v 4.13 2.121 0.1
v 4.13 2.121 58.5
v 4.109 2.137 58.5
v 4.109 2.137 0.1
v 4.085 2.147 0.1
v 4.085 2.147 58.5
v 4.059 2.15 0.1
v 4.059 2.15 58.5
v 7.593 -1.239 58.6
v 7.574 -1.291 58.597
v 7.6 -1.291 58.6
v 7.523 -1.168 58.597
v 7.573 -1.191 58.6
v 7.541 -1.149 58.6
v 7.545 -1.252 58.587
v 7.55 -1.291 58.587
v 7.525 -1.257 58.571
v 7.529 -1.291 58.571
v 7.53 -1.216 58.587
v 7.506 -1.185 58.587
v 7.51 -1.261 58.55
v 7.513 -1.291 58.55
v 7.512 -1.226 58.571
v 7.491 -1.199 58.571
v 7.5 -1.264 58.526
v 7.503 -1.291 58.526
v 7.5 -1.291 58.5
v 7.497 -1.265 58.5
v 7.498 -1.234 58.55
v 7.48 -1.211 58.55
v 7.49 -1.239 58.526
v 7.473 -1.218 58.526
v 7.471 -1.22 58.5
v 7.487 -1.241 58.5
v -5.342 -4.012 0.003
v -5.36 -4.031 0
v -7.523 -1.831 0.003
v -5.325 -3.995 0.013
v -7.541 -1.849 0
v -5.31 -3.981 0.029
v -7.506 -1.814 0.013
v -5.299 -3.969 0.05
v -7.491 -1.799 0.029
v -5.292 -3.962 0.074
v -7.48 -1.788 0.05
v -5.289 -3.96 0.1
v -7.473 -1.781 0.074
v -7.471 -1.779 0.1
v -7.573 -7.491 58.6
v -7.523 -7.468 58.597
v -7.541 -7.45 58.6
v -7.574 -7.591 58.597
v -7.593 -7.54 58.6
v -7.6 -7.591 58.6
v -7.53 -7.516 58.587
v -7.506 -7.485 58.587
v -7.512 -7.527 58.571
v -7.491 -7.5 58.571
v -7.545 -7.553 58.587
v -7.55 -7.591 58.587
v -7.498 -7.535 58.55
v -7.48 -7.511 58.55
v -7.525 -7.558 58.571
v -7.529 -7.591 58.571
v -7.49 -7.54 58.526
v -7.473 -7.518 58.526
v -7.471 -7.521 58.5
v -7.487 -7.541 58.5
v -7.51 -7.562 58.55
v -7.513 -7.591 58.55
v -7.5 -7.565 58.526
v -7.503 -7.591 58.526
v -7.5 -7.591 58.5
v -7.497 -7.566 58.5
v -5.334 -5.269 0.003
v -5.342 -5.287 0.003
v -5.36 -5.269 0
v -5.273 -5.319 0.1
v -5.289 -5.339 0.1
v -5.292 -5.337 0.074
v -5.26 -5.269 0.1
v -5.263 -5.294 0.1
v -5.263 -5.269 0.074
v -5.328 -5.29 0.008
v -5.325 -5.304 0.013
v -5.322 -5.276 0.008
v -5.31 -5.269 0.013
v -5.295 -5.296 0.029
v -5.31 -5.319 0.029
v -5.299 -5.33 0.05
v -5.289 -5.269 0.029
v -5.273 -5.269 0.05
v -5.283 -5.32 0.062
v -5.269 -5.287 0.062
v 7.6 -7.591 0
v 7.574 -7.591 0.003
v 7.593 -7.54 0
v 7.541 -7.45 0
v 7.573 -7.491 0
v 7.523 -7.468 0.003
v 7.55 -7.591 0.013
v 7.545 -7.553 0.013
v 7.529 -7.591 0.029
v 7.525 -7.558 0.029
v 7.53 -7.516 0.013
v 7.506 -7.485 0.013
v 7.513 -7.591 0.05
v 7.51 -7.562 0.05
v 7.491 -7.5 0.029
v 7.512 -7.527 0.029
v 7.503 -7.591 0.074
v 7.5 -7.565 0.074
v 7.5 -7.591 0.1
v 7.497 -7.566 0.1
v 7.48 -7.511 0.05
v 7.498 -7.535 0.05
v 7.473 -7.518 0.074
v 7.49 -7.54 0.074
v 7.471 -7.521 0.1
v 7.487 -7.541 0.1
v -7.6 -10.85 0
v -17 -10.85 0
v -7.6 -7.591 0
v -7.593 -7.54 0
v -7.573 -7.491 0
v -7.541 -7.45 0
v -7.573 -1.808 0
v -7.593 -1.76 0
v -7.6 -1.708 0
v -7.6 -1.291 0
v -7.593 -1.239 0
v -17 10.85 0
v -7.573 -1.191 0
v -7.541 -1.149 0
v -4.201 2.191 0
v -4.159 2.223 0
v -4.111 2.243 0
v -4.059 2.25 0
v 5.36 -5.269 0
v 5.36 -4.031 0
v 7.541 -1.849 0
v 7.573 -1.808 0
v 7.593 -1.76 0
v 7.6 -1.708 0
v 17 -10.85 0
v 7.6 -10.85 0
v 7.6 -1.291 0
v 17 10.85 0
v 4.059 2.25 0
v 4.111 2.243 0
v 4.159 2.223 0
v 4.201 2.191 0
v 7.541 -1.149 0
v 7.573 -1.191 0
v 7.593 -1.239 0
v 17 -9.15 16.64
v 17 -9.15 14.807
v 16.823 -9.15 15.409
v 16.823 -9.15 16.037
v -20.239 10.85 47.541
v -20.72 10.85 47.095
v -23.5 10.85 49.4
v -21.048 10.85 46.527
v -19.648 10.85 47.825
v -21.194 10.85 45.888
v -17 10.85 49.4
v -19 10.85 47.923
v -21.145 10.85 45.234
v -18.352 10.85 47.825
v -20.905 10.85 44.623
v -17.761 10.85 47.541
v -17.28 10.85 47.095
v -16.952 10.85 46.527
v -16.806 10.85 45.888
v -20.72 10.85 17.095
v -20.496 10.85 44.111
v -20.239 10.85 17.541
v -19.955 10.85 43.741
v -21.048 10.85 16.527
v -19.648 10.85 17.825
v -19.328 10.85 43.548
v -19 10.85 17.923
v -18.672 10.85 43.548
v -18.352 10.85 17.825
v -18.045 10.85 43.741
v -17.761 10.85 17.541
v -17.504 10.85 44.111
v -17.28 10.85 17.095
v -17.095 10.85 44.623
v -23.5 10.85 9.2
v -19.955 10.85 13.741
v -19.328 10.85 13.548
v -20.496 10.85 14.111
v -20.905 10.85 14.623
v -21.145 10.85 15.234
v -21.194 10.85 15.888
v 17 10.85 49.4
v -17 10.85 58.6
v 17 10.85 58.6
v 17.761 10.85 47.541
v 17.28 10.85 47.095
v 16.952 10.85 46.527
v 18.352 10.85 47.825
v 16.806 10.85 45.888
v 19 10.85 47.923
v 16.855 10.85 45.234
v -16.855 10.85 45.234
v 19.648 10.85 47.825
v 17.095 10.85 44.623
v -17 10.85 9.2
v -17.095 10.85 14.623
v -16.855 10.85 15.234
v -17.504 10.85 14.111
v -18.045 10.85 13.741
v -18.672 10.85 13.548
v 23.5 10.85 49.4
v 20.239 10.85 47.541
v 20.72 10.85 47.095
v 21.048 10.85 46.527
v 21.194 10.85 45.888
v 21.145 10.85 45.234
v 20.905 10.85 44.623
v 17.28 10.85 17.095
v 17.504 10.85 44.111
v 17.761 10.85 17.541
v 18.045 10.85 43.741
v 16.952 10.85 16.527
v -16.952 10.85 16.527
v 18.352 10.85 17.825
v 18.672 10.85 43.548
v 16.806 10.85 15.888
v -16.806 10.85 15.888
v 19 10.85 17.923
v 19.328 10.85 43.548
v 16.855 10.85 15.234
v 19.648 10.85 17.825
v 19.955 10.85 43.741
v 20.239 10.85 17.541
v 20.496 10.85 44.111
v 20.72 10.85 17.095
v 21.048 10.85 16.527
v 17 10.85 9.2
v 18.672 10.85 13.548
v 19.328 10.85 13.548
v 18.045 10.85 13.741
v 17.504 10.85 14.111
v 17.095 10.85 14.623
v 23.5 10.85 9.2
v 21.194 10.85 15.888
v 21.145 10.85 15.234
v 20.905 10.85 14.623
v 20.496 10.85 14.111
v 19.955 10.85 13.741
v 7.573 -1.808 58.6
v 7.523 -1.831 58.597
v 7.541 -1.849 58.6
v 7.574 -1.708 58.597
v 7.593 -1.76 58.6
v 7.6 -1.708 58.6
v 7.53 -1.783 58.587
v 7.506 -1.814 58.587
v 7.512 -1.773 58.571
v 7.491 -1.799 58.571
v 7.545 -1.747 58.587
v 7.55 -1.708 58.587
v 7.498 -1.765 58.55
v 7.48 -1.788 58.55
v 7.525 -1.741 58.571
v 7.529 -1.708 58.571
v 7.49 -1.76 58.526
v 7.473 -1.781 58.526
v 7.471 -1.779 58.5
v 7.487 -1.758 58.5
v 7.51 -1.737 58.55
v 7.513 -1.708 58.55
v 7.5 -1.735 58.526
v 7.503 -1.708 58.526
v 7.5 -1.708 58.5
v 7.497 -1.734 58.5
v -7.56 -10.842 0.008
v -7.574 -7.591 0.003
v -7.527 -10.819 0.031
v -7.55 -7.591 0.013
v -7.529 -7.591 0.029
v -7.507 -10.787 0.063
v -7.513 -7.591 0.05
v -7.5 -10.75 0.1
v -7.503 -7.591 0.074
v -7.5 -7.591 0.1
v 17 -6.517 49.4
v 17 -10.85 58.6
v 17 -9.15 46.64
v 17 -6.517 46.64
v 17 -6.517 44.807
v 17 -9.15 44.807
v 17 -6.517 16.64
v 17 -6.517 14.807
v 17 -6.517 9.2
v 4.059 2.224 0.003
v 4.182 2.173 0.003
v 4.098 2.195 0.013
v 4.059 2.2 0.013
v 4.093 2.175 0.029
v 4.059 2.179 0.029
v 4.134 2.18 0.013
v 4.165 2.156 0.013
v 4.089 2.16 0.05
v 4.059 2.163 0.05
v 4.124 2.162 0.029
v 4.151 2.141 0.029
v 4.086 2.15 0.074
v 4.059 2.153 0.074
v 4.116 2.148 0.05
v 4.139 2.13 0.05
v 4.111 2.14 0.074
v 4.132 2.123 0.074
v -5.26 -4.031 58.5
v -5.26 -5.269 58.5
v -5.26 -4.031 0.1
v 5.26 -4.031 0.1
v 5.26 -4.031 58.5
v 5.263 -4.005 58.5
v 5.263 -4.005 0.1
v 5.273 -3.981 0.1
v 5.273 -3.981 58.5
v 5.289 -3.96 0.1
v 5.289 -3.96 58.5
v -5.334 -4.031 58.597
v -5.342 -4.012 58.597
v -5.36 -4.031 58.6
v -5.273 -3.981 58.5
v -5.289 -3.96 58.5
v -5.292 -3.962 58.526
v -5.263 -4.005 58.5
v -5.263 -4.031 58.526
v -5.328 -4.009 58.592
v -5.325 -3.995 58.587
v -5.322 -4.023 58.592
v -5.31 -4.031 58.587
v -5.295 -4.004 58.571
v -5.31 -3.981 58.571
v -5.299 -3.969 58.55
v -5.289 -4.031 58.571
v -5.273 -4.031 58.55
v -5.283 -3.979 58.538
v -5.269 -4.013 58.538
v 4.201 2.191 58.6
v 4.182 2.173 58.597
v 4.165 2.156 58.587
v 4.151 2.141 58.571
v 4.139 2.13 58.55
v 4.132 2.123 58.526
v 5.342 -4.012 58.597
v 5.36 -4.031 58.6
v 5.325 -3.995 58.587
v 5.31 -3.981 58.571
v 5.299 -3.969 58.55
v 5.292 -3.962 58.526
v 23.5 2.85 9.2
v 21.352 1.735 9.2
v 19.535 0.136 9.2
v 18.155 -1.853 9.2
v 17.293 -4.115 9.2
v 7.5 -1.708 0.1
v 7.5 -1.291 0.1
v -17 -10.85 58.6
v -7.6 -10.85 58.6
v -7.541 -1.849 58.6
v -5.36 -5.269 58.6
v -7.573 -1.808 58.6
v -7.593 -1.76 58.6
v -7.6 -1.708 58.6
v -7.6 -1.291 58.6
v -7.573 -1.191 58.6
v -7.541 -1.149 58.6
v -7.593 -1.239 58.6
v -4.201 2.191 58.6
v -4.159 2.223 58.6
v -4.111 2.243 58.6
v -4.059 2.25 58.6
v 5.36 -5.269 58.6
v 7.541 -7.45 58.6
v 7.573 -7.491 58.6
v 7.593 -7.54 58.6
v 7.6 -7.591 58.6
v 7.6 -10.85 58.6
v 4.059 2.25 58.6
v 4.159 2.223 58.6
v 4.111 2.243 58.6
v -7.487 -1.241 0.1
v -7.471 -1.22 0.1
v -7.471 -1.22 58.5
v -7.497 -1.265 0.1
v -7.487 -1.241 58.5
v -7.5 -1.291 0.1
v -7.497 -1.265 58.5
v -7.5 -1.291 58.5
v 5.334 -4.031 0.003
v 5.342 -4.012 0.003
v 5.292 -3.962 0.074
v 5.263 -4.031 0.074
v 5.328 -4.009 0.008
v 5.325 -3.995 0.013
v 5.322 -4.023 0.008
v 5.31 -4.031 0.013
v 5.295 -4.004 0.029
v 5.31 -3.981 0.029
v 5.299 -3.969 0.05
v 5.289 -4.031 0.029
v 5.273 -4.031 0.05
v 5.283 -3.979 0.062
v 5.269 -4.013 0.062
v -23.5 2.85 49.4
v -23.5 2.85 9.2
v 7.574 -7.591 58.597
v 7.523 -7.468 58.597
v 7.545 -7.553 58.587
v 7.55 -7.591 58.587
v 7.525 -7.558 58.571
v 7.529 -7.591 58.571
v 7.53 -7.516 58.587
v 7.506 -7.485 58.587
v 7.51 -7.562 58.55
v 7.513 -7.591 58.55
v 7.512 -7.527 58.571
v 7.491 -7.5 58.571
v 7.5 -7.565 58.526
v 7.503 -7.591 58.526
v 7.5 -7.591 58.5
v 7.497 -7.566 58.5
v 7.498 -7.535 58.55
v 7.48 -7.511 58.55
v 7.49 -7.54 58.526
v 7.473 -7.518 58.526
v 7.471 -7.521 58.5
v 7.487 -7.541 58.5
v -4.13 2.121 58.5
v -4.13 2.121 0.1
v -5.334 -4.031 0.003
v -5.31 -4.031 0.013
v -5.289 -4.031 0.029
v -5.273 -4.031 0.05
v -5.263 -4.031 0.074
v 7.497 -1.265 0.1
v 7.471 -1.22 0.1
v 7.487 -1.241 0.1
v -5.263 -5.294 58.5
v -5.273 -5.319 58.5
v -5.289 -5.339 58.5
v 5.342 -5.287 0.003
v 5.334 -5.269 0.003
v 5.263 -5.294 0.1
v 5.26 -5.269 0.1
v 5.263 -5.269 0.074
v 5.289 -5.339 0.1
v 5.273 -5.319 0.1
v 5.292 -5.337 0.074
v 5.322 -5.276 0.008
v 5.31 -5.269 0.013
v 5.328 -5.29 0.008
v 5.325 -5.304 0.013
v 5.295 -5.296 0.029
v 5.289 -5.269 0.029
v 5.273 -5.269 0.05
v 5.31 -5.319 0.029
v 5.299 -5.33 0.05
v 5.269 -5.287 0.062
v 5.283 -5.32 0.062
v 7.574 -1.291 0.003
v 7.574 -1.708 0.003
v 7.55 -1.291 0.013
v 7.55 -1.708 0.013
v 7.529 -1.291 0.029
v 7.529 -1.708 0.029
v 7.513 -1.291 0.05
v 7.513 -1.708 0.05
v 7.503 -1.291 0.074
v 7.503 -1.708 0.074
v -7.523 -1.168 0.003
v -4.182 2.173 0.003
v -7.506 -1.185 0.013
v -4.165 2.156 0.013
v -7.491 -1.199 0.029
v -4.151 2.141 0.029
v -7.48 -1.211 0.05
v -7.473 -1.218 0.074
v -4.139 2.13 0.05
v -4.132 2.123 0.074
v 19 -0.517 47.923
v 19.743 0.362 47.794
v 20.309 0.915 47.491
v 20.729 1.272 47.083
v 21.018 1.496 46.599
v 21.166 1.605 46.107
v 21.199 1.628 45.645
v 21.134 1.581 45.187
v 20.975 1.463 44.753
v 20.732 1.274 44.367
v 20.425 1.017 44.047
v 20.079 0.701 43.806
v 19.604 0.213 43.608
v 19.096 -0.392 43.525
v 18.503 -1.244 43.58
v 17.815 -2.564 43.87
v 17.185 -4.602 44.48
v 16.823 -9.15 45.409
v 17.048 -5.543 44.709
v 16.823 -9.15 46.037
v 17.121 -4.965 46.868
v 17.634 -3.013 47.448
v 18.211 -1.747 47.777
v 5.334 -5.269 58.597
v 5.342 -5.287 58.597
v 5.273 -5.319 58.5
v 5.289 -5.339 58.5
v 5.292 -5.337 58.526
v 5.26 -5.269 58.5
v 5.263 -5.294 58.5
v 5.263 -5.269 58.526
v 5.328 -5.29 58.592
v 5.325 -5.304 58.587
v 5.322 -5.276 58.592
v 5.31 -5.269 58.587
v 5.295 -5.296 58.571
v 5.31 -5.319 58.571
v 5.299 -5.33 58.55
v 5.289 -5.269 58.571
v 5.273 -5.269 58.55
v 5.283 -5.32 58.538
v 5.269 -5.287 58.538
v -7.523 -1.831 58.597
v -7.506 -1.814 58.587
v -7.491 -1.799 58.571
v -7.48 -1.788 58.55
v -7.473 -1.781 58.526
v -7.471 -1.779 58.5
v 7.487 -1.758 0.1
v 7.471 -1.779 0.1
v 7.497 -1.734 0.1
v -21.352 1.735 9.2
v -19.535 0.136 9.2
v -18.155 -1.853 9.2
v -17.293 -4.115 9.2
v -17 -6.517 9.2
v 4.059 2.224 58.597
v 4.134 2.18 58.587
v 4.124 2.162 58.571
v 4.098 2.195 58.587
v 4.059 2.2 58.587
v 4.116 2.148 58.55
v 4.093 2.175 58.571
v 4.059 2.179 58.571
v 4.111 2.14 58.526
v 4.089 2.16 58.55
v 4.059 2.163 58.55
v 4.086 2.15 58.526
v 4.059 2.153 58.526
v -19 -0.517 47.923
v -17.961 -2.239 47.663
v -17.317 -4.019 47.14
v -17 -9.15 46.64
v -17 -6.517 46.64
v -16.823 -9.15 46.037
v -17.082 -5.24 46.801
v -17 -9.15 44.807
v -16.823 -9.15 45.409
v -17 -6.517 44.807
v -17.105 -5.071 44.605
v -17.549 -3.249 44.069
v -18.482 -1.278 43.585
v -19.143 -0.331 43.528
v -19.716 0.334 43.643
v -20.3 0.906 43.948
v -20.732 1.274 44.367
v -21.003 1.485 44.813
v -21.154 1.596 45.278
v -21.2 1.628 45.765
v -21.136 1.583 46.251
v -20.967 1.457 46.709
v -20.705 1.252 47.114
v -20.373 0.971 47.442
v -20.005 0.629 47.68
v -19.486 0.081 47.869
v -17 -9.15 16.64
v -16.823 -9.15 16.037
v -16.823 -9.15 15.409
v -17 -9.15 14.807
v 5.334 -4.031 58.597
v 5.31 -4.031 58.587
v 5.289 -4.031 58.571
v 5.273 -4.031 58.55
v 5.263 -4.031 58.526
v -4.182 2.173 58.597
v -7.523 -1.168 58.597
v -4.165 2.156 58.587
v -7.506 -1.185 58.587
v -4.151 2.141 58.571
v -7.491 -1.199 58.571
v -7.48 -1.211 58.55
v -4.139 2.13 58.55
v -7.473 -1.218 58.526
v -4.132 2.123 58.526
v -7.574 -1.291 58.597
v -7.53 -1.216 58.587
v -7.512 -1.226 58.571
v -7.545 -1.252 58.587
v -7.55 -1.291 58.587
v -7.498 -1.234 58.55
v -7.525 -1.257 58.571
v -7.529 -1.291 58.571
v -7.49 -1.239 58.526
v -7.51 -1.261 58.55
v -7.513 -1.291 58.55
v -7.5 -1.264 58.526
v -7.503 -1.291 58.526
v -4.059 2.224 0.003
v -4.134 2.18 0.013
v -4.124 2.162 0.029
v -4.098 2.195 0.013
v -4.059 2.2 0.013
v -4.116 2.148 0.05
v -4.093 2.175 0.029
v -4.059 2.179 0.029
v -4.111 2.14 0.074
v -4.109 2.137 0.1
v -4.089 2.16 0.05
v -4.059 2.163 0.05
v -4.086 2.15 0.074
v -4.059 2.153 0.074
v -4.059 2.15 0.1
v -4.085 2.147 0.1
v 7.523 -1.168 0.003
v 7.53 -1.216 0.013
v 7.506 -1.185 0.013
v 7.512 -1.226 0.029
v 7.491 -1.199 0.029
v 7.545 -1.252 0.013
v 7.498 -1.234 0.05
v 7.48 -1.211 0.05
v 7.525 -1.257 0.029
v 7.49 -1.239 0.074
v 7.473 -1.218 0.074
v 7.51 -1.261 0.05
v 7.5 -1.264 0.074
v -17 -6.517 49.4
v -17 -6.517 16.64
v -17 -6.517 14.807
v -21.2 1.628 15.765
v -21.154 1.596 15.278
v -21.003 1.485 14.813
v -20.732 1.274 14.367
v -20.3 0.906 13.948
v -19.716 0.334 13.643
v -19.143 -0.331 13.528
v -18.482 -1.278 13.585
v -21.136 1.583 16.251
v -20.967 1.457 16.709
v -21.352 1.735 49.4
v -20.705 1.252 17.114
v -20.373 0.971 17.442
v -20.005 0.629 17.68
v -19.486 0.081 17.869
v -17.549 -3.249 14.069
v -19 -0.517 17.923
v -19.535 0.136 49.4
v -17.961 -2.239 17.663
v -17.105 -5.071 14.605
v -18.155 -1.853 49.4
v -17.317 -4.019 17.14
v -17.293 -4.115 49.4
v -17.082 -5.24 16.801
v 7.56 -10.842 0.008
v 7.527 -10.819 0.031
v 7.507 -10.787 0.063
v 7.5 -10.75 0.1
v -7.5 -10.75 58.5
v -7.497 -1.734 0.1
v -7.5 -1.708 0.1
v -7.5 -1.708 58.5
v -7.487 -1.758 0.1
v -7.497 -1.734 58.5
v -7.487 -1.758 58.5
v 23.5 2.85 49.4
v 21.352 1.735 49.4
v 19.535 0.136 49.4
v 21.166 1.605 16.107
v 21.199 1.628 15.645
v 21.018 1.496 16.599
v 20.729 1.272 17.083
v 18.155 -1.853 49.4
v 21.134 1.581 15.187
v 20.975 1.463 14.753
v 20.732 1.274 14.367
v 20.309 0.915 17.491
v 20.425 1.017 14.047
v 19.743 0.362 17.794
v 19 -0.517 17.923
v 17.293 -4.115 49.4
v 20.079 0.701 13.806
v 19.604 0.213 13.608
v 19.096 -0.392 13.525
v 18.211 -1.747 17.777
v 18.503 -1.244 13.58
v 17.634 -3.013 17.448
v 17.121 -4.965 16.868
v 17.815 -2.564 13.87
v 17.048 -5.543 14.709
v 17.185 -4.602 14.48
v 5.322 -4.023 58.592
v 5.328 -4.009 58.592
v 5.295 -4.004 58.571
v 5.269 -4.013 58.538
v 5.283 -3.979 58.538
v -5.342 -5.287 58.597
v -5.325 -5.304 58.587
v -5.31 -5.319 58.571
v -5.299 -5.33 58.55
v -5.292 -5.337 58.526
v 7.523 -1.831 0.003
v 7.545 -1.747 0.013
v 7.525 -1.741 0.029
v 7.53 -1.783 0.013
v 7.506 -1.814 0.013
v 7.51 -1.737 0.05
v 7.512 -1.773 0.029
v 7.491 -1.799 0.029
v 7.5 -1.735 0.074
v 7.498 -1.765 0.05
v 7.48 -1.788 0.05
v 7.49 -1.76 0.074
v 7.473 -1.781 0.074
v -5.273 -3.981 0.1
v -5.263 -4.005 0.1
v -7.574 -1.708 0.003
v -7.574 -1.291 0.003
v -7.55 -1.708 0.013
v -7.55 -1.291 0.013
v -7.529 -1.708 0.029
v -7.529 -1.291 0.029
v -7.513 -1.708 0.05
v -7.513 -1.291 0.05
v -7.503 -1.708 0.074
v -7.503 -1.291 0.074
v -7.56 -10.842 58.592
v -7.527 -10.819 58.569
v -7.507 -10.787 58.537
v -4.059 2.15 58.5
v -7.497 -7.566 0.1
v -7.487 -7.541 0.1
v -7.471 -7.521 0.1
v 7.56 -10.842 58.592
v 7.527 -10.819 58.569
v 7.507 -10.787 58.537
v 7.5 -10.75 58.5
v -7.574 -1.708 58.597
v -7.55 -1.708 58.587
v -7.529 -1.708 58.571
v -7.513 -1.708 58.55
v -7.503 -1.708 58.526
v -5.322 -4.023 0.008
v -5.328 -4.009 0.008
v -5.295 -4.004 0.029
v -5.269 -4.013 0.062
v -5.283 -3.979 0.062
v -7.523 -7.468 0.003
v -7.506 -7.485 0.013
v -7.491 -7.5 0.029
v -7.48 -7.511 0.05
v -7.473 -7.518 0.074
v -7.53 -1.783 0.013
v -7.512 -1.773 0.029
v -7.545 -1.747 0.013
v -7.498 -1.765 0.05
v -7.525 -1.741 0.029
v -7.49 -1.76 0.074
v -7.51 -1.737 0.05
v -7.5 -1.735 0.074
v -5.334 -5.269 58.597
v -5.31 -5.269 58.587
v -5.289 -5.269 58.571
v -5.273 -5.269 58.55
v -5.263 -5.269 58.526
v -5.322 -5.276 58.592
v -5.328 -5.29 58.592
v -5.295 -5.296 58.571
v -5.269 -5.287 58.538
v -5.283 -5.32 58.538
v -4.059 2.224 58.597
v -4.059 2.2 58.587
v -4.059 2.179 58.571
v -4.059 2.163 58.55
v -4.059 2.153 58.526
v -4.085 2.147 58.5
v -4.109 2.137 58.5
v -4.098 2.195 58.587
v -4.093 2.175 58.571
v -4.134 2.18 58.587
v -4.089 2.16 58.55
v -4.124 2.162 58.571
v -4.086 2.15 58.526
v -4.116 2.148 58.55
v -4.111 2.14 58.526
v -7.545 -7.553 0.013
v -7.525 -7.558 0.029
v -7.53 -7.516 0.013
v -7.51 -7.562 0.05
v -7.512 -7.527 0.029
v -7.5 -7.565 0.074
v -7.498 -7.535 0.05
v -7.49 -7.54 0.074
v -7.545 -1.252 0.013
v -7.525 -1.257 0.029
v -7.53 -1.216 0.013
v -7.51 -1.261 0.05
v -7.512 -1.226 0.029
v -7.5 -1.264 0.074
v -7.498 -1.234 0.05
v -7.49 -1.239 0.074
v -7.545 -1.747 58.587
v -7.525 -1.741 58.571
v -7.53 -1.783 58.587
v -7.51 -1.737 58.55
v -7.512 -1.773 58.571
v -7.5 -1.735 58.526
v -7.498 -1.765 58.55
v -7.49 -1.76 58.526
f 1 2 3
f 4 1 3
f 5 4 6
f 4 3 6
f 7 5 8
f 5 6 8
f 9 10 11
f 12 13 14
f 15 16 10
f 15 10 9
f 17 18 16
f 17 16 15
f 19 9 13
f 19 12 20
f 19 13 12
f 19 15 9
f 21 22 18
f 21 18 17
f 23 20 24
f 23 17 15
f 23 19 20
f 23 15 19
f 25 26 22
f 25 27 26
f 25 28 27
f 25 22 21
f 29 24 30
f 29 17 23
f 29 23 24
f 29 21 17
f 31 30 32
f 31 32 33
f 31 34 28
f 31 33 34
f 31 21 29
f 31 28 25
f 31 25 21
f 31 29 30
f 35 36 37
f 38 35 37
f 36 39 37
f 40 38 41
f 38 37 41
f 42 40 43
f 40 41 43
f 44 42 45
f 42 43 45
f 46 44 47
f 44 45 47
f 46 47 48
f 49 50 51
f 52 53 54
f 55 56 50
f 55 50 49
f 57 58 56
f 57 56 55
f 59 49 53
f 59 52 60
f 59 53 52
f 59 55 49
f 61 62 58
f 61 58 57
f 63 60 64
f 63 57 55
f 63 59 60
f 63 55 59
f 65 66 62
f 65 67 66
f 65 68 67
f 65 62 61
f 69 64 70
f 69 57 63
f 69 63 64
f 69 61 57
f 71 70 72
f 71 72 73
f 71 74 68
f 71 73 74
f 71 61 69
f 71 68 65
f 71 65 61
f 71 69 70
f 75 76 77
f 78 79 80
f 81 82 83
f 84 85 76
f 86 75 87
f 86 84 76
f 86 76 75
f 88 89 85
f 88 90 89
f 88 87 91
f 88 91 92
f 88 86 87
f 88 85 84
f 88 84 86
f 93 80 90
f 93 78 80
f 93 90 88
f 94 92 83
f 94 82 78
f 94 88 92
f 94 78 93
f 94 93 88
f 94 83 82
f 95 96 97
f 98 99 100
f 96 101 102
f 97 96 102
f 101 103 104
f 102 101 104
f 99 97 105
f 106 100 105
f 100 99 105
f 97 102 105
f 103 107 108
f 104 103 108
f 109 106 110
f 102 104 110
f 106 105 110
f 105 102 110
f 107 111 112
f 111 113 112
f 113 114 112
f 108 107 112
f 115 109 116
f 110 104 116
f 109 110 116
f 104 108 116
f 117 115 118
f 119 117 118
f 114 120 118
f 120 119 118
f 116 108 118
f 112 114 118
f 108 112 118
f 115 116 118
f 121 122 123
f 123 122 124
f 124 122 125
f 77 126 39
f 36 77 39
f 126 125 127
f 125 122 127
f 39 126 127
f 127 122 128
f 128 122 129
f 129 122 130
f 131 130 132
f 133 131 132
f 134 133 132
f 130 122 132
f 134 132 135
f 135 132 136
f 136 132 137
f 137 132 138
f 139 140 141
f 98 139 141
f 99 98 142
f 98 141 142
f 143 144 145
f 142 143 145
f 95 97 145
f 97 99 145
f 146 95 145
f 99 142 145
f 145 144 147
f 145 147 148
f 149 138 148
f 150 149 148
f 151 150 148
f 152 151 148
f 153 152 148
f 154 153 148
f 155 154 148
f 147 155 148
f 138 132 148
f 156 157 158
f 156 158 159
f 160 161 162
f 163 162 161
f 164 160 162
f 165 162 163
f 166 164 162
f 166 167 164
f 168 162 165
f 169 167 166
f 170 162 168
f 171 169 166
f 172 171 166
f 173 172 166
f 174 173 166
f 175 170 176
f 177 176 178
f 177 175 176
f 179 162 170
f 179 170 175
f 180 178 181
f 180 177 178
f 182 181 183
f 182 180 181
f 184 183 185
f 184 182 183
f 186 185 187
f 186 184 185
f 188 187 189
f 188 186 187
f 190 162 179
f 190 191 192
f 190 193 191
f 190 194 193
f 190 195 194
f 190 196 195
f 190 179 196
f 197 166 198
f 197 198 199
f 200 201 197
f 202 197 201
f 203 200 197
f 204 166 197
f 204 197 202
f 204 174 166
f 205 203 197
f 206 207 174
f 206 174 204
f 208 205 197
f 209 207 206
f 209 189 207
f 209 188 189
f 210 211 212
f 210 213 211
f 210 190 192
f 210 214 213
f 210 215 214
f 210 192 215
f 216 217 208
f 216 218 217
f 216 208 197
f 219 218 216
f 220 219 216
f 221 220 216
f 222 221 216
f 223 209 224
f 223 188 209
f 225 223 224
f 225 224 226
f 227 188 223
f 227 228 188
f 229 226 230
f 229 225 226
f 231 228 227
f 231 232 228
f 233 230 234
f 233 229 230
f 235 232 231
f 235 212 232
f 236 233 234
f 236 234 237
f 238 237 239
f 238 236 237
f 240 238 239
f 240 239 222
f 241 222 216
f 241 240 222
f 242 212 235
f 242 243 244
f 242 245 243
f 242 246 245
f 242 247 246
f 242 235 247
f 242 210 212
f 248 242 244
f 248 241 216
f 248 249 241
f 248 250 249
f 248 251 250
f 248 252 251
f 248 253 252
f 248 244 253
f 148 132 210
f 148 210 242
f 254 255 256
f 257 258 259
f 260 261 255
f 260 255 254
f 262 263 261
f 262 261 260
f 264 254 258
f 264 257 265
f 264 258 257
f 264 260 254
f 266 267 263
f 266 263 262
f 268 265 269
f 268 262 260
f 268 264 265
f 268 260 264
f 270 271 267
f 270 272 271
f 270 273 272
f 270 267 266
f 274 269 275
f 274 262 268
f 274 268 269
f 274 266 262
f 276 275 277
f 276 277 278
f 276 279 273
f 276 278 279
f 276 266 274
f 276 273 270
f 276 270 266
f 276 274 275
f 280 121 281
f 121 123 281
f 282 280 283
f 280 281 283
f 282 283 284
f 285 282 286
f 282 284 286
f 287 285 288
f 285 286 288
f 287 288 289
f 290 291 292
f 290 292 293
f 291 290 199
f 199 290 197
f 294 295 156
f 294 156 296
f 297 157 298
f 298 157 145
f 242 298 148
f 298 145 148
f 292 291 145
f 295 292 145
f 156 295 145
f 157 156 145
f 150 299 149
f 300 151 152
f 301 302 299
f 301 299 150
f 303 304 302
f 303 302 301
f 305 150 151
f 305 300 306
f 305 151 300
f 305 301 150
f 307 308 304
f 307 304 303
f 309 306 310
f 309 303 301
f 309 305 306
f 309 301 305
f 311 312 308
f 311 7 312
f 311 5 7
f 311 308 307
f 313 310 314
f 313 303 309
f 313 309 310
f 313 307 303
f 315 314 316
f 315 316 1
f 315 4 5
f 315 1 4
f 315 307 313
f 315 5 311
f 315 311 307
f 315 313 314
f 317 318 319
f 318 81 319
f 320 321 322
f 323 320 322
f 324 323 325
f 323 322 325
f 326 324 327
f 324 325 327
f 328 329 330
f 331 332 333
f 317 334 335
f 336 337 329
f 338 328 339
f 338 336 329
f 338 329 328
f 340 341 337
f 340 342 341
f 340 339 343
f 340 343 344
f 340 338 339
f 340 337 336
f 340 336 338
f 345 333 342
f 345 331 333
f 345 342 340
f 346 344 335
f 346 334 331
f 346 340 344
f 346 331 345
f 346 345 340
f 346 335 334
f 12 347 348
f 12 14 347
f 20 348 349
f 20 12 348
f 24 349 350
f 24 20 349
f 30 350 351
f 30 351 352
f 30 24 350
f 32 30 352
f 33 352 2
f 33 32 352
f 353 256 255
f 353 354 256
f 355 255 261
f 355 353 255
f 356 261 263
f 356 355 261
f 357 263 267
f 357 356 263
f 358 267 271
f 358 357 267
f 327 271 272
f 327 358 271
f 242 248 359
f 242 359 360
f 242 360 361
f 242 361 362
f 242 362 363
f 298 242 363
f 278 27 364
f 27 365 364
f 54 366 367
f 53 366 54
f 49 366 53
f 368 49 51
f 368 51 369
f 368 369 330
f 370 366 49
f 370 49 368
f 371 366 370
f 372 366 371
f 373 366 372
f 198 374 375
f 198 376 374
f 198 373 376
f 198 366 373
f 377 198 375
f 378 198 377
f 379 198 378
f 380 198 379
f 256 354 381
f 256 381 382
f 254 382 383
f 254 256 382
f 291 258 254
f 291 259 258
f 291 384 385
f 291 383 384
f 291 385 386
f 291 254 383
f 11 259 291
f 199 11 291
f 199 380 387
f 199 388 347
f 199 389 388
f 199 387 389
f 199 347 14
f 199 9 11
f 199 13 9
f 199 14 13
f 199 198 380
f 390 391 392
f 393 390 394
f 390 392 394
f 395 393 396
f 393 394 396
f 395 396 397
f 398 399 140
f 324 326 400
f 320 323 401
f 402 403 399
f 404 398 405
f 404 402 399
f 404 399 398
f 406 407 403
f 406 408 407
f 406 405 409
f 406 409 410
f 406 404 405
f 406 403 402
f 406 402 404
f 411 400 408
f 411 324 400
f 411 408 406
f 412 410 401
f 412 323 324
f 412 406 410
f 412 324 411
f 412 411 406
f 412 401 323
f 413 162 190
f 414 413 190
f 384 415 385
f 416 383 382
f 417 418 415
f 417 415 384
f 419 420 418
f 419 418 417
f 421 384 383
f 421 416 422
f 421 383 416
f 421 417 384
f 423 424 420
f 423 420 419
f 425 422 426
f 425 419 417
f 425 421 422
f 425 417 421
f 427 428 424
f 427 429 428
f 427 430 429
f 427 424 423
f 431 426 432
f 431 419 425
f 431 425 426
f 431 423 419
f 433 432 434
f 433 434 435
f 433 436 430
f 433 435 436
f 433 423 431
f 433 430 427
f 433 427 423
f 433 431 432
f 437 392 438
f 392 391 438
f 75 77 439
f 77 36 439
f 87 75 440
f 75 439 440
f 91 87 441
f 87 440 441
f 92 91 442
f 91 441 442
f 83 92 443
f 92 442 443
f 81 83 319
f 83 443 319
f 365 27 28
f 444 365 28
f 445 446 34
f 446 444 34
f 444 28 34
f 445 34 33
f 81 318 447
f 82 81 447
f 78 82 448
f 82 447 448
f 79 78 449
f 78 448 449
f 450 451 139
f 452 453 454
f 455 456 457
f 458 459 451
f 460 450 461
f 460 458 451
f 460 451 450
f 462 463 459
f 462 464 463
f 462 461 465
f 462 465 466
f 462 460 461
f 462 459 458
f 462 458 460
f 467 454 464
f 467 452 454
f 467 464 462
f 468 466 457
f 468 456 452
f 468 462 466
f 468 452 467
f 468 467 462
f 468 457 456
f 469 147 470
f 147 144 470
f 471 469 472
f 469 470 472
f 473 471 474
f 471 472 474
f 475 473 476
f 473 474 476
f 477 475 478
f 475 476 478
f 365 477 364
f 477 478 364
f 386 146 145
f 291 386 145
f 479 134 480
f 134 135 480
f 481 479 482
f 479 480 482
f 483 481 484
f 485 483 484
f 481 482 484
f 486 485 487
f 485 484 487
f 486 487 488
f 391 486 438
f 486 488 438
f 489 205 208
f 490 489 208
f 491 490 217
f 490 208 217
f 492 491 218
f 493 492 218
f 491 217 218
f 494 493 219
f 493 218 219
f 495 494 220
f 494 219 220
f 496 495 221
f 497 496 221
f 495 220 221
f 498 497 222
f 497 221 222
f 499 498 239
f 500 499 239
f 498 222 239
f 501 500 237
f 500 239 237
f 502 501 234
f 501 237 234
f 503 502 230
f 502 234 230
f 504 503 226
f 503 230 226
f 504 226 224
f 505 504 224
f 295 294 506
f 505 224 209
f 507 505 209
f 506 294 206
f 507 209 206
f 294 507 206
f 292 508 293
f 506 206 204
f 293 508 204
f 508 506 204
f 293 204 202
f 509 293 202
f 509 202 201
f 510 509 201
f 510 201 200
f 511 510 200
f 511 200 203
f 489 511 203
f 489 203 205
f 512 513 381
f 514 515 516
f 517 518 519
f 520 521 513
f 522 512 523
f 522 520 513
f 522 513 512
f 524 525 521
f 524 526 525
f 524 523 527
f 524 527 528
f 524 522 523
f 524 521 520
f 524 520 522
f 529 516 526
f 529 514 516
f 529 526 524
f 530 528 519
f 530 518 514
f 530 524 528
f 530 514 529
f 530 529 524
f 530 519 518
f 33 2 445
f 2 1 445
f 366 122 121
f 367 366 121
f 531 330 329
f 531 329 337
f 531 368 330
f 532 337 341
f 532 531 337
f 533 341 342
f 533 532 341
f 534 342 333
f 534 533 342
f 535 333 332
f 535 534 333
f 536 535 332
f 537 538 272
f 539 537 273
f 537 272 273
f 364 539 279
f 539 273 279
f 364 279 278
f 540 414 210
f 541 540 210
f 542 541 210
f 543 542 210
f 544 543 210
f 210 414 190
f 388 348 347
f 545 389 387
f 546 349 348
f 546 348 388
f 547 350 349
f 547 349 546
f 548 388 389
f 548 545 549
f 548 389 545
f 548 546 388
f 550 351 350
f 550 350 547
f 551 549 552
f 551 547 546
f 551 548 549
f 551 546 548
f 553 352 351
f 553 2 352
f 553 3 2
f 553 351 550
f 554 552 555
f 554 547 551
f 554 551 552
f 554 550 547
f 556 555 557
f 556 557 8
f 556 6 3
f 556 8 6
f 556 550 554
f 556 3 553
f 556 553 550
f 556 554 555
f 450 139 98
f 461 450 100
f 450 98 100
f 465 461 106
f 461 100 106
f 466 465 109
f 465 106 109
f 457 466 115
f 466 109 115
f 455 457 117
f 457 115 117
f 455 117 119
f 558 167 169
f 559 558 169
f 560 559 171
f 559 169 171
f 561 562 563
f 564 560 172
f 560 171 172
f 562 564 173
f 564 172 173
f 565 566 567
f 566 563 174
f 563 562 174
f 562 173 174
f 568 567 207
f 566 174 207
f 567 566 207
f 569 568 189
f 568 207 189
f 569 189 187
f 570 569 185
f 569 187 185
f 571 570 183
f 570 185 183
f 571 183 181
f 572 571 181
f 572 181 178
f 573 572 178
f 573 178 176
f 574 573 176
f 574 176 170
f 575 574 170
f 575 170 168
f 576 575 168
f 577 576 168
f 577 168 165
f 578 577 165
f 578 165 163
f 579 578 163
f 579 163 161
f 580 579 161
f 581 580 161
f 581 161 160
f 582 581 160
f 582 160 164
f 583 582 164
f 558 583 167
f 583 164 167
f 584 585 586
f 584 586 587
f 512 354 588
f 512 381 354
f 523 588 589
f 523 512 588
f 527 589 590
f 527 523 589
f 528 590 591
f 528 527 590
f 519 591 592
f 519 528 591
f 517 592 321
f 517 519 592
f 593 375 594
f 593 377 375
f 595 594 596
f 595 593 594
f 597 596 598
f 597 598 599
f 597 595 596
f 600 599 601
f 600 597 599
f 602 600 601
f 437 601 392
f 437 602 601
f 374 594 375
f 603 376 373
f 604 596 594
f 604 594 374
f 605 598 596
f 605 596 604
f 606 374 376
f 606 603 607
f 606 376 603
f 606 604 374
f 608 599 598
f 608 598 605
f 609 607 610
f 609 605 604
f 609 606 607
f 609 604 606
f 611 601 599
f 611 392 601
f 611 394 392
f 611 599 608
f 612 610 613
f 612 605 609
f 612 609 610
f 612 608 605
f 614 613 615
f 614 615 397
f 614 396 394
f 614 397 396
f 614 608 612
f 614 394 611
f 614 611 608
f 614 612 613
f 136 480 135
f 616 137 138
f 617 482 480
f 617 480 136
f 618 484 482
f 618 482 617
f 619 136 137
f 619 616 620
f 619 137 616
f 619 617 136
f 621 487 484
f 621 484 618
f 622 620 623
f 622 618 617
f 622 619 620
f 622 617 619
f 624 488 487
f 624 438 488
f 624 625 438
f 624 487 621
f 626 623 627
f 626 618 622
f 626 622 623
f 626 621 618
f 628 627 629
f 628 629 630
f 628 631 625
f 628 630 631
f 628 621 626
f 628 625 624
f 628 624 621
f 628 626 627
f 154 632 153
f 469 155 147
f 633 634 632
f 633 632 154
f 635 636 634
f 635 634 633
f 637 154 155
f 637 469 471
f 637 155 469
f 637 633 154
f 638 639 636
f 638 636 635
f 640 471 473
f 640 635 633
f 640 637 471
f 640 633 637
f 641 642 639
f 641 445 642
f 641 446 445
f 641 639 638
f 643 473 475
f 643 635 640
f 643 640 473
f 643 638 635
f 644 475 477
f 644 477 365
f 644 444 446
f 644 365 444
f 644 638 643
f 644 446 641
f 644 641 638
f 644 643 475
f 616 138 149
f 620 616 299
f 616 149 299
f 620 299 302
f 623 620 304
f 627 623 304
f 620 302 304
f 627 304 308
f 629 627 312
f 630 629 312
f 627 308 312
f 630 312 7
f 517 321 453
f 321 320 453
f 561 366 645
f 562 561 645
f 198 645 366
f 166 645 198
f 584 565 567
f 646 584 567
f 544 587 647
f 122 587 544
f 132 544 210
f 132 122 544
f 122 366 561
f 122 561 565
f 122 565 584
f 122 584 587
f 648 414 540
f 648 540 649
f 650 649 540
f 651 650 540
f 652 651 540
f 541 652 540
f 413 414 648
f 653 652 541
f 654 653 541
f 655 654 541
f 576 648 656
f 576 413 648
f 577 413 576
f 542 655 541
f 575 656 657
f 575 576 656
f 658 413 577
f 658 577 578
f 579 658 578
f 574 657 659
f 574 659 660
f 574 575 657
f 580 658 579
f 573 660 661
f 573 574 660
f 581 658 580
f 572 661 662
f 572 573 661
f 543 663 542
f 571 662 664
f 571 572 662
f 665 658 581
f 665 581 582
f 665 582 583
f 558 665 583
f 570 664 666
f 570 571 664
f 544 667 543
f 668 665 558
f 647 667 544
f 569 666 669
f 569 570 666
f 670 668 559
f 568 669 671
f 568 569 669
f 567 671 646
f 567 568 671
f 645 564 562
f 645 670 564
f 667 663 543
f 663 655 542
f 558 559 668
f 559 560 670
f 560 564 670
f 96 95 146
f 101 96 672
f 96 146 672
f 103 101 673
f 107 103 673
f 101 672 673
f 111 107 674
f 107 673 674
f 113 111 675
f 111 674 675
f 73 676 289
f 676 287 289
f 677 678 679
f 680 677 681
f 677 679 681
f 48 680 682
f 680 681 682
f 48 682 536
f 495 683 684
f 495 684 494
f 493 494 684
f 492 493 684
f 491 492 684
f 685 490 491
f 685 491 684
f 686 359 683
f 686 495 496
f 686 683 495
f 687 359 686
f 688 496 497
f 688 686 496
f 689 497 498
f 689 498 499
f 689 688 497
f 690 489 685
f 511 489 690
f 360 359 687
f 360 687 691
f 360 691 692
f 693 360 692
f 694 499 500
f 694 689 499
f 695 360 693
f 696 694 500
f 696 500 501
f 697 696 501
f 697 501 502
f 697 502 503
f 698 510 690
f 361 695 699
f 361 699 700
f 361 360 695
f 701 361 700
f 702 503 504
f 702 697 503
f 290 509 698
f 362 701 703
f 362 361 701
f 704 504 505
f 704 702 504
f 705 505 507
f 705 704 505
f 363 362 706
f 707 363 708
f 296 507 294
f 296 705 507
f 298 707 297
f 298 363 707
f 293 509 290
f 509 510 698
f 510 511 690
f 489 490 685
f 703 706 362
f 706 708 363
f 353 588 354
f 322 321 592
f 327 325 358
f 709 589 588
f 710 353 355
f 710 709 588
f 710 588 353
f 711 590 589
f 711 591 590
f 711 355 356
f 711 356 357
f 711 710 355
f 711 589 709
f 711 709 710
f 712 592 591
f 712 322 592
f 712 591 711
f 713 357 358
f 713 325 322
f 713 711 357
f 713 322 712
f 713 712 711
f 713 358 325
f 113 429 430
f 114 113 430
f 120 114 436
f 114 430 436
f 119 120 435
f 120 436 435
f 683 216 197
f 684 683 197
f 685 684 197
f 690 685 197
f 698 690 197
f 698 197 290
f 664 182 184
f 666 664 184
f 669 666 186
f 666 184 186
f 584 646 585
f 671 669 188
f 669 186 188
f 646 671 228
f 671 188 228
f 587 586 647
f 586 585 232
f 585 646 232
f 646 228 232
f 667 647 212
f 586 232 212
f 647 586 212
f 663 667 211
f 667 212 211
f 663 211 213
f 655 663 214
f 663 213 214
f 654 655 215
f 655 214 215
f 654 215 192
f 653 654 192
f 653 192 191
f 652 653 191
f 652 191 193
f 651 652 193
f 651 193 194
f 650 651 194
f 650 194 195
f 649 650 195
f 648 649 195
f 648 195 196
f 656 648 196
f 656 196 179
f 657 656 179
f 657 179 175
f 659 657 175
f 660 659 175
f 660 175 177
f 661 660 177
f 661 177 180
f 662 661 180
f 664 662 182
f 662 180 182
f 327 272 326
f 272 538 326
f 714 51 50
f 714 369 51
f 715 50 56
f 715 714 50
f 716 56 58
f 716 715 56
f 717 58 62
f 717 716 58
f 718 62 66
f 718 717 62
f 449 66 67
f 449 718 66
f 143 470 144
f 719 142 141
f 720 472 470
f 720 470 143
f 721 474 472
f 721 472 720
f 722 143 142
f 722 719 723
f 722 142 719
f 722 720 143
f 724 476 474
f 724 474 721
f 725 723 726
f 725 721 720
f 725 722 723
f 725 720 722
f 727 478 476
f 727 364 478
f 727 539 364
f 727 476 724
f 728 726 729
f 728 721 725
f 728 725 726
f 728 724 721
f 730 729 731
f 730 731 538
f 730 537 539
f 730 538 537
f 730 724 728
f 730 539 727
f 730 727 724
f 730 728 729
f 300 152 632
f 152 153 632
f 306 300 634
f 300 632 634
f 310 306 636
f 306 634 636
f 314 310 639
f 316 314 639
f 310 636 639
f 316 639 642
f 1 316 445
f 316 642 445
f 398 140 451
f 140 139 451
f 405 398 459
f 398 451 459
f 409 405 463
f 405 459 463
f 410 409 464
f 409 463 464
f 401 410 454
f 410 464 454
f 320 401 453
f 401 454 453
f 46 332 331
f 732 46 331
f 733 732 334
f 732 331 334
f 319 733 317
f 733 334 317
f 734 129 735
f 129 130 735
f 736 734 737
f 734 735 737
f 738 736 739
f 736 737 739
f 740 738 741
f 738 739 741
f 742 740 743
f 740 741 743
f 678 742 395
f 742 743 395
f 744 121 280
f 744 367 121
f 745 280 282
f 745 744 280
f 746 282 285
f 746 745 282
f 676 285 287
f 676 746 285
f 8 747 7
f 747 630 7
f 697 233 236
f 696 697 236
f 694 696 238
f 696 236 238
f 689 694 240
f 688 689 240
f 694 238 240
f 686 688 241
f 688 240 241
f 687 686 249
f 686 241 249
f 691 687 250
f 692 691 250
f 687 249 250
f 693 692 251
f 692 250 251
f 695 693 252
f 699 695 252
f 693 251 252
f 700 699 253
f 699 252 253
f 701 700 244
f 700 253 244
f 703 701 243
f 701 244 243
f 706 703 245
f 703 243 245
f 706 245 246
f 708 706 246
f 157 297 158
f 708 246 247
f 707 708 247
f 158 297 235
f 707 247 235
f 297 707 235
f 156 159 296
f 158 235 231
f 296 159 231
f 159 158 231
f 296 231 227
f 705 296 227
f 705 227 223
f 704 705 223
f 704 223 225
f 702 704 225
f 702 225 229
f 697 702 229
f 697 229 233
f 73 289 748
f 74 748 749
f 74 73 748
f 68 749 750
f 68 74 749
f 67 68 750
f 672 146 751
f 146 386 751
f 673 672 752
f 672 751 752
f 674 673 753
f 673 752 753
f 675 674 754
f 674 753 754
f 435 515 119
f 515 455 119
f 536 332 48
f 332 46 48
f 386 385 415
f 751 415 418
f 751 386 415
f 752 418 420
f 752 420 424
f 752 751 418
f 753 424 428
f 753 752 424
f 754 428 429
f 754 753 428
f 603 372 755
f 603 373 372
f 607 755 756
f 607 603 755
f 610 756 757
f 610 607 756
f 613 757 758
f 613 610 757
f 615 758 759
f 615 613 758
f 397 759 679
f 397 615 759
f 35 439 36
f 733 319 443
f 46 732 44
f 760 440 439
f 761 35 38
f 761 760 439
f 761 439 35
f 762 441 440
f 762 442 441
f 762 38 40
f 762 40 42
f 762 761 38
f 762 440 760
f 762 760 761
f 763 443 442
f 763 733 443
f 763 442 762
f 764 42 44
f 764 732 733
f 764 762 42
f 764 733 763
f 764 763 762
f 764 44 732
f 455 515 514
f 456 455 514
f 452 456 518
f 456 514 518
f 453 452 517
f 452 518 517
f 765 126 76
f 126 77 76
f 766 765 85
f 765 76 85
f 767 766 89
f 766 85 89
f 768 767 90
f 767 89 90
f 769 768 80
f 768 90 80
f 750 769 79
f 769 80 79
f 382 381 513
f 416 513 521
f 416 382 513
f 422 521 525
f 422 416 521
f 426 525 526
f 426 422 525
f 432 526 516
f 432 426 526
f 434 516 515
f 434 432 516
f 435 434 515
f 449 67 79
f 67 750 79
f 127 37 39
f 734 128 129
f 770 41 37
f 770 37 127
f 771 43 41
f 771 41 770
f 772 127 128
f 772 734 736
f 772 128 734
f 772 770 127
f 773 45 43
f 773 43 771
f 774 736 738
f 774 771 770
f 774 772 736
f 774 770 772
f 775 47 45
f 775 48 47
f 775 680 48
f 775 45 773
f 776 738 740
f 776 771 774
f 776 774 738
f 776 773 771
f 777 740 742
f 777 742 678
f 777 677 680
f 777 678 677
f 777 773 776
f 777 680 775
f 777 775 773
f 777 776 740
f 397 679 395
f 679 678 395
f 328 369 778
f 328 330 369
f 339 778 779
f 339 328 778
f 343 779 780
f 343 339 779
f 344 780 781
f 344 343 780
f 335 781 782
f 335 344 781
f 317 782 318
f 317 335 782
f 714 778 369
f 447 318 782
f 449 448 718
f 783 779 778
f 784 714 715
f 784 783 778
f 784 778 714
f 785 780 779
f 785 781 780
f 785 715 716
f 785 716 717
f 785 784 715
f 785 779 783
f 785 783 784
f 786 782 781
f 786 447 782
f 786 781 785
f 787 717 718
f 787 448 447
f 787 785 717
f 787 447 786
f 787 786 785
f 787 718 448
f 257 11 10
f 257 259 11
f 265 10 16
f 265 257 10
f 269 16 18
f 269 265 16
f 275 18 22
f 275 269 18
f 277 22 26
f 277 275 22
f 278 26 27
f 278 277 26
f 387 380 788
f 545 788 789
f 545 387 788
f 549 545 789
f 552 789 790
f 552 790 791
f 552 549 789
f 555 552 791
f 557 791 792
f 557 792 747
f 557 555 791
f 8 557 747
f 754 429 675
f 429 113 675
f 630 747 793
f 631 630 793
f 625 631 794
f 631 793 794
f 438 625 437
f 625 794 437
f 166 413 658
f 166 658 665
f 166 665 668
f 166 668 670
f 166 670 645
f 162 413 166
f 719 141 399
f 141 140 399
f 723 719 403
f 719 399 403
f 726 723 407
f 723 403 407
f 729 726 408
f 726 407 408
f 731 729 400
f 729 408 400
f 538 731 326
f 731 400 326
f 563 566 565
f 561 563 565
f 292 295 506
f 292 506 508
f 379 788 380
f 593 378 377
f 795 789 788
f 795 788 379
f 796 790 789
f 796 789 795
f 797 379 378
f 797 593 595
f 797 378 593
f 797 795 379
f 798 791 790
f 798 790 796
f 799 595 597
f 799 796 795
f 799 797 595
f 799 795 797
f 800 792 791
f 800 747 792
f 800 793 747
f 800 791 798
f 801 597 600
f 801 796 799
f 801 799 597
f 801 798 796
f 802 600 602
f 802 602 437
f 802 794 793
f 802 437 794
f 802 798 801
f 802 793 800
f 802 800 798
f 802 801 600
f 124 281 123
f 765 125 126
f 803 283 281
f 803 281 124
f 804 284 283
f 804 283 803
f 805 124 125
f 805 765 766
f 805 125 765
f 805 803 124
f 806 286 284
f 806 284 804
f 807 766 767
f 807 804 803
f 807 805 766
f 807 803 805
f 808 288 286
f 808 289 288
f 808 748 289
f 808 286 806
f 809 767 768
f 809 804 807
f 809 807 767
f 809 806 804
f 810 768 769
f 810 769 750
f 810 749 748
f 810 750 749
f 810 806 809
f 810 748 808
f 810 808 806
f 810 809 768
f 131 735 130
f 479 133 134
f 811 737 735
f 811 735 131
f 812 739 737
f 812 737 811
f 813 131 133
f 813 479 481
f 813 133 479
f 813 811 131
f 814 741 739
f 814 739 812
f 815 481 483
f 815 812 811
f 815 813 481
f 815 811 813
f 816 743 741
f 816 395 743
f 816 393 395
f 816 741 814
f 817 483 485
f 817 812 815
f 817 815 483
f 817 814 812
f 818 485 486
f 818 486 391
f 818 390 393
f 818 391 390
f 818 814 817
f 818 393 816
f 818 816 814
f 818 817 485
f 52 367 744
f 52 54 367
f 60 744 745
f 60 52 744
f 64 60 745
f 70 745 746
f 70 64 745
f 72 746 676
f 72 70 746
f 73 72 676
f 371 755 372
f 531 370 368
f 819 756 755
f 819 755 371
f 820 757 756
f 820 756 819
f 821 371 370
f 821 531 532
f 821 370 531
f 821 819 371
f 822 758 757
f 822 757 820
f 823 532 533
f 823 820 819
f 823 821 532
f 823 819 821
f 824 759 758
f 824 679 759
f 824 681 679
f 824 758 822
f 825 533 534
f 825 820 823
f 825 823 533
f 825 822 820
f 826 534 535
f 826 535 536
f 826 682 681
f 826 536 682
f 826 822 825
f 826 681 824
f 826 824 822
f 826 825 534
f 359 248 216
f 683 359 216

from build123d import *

# Parameters (mm, degrees)
SKETCH_4_W          = 34
SKETCH_4_H          = 21.7
EXTRUDE_2_DEPTH     = 58.6
CUT_EXTRUDE_1_DEPTH = 58.6
FILLET_1_R          = 0.1
EXTRUDE_4_DEPTH     = 6.5
EXTRUDE_5_DEPTH     = 6.5
FILLET_3_R          = 10
FILLET_4_R          = 10
SKETCH_11_R         = 2.2
CUT_EXTRUDE_2_DEPTH = 20


with BuildPart() as part:
    # Эскиз4 → Бобышка-Вытянуть2 (new body)
    with BuildSketch(Plane.XY):
        Rectangle(SKETCH_4_W, SKETCH_4_H)
    extrude(amount=EXTRUDE_2_DEPTH)

    # Эскиз5 → Вырез-Вытянуть1 (cut)
    with BuildSketch(Plane(origin=(0, 0, 0), x_dir=(-1, 0, 0), z_dir=(0, 0, -1))):
        Polygon((0, -10.85), (7.5, -10.85), (7.5, -7.55), (5.26, -5.31), (5.26, -3.989299906), (7.5, -1.749299906), (7.5, -1.249299906), (4.100700094, 2.15), (-4.100700094, 2.15), (-7.5, -1.249299906), (-7.5, -1.749299906), (-5.26, -3.989299906), (-5.26, -5.31), (-7.5, -7.55), (-7.5, -10.85), align=None)
    extrude(amount=-CUT_EXTRUDE_1_DEPTH, mode=Mode.SUBTRACT)

    # Скругление1
    fillet_1_edges = [part.edges().sort_by_distance(p)[0] for p in [
        (7.5, -9.2, 58.6),
        (7.5, -10.85, 29.3),
        (6.38, -6.43, 58.6),
        (7.5, -7.55, 29.3),
        (5.26, -4.649649953, 58.6),
        (5.26, -5.31, 29.3),
        (6.38, -2.869299906, 58.6),
        (5.26, -3.989299906, 29.3),
        (7.5, -1.499299906, 58.6),
        (7.5, -1.749299906, 29.3),
        (5.800350047, 0.450350047, 58.6),
        (7.5, -1.249299906, 29.3),
        (0, 2.15, 58.6),
        (4.100700094, 2.15, 29.3),
        (-5.800350047, 0.450350047, 58.6),
        (-4.100700094, 2.15, 29.3),
        (-7.5, -1.499299906, 58.6),
        (-7.5, -1.249299906, 29.3),
        (-6.38, -2.869299906, 58.6),
        (-7.5, -1.749299906, 29.3),
        (-5.26, -4.649649953, 58.6),
        (-5.26, -3.989299906, 29.3),
        (-6.38, -6.43, 58.6),
        (-5.26, -5.31, 29.3),
        (-7.5, -9.2, 58.6),
        (-7.5, -7.55, 29.3),
        (-7.5, -10.85, 29.3),
        (7.5, -9.2, 0),
        (-7.5, -9.2, 0),
        (-6.38, -6.43, 0),
        (-5.26, -4.649649953, 0),
        (-6.38, -2.869299906, 0),
        (-7.5, -1.499299906, 0),
        (-5.800350047, 0.450350047, 0),
        (0, 2.15, 0),
        (5.800350047, 0.450350047, 0),
        (7.5, -1.499299906, 0),
        (6.38, -2.869299906, 0),
        (5.26, -4.649649953, 0),
        (6.38, -6.43, 0),
    ]]
    fillet(fillet_1_edges, radius=FILLET_1_R)

    # Эскиз9 → Бобышка-Вытянуть4 (add)
    with BuildSketch(Plane(origin=(17, 0, 0), x_dir=(0, 0, -1), z_dir=(1, 0, 0))):
        Polygon((-29.3, 10.85), (-9.2, 10.85), (-9.2, 2.85), (-49.4, 2.85), (-49.4, 10.85), align=None)
    extrude(amount=EXTRUDE_4_DEPTH)

    # Эскиз10 → Бобышка-Вытянуть5 (add)
    with BuildSketch(Plane.ZY.offset(17)):
        Polygon((29.3, 10.85), (49.4, 10.85), (49.4, 2.85), (9.2, 2.85), (9.2, 10.85), align=None)
    extrude(amount=EXTRUDE_5_DEPTH)

    # Скругление3
    # the kernel refuses this fillet: 10 mm, written as the material it adds along each edge
    with BuildSketch(Plane(origin=(-17, 2.85, 49.4), x_dir=(0, -1, 0), z_dir=(0, 0, -1))) as fillet_3_piece_1:
        with BuildLine():
            CenterArc((9.367496998, 10), FILLET_3_R, 200.487315115, 69.512684885)
            Line((0, 6.5), (-0.18734994, 6.43))
            ThreePointArc((-0.18734994, 6.43), (-0.2, 3.25), (-0.2, 0))
            Line((-0.2, 0), (0, -0.2))
            Line((0, -0.2), (9.367496998, -0.2))
            Line((9.367496998, -0.2), (9.367496998, 0))
        make_face()
    extrude(amount=40.2)

    # Скругление4
    # the kernel refuses this fillet: 10 mm, written as the material it adds along each edge
    with BuildSketch(Plane(origin=(17, 2.85, 9.2), x_dir=(1, 0, 0), z_dir=(0, 0, 1))) as fillet_4_piece_1:
        with BuildLine():
            CenterArc((10, -9.367496998), FILLET_4_R, 110.487315115, 69.512684885)
            Line((0, -9.367496998), (-0.2, -9.367496998))
            Line((-0.2, -9.367496998), (-0.2, 0))
            Line((-0.2, 0), (0, 0.2))
            ThreePointArc((0, 0.2), (3.25, 0.2), (6.43, 0.18734994))
            Line((6.43, 0.18734994), (6.5, 0))
        make_face()
    extrude(amount=40.2)

    # Эскиз11 → Вырез-Вытянуть2 (cut)
    with BuildSketch(Plane(origin=(0, 10.85, 0), x_dir=(1, 0, 0), z_dir=(0, 1, 0))):
        with Locations(Location((-19, -15.723228877, 0), (0, 0, 270))):
            Circle(SKETCH_11_R)
        with Locations(Location((19, -15.723228877, 0), (0, 0, 270))):
            Circle(SKETCH_11_R)
        with Locations(Location((-19, -45.723228877, 0), (0, 0, 270))):
            Circle(SKETCH_11_R)
        with Locations(Location((19, -45.723228877, 0), (0, 0, 270))):
            Circle(SKETCH_11_R)
    extrude(amount=-CUT_EXTRUDE_2_DEPTH, mode=Mode.SUBTRACT)


solid = part.part
